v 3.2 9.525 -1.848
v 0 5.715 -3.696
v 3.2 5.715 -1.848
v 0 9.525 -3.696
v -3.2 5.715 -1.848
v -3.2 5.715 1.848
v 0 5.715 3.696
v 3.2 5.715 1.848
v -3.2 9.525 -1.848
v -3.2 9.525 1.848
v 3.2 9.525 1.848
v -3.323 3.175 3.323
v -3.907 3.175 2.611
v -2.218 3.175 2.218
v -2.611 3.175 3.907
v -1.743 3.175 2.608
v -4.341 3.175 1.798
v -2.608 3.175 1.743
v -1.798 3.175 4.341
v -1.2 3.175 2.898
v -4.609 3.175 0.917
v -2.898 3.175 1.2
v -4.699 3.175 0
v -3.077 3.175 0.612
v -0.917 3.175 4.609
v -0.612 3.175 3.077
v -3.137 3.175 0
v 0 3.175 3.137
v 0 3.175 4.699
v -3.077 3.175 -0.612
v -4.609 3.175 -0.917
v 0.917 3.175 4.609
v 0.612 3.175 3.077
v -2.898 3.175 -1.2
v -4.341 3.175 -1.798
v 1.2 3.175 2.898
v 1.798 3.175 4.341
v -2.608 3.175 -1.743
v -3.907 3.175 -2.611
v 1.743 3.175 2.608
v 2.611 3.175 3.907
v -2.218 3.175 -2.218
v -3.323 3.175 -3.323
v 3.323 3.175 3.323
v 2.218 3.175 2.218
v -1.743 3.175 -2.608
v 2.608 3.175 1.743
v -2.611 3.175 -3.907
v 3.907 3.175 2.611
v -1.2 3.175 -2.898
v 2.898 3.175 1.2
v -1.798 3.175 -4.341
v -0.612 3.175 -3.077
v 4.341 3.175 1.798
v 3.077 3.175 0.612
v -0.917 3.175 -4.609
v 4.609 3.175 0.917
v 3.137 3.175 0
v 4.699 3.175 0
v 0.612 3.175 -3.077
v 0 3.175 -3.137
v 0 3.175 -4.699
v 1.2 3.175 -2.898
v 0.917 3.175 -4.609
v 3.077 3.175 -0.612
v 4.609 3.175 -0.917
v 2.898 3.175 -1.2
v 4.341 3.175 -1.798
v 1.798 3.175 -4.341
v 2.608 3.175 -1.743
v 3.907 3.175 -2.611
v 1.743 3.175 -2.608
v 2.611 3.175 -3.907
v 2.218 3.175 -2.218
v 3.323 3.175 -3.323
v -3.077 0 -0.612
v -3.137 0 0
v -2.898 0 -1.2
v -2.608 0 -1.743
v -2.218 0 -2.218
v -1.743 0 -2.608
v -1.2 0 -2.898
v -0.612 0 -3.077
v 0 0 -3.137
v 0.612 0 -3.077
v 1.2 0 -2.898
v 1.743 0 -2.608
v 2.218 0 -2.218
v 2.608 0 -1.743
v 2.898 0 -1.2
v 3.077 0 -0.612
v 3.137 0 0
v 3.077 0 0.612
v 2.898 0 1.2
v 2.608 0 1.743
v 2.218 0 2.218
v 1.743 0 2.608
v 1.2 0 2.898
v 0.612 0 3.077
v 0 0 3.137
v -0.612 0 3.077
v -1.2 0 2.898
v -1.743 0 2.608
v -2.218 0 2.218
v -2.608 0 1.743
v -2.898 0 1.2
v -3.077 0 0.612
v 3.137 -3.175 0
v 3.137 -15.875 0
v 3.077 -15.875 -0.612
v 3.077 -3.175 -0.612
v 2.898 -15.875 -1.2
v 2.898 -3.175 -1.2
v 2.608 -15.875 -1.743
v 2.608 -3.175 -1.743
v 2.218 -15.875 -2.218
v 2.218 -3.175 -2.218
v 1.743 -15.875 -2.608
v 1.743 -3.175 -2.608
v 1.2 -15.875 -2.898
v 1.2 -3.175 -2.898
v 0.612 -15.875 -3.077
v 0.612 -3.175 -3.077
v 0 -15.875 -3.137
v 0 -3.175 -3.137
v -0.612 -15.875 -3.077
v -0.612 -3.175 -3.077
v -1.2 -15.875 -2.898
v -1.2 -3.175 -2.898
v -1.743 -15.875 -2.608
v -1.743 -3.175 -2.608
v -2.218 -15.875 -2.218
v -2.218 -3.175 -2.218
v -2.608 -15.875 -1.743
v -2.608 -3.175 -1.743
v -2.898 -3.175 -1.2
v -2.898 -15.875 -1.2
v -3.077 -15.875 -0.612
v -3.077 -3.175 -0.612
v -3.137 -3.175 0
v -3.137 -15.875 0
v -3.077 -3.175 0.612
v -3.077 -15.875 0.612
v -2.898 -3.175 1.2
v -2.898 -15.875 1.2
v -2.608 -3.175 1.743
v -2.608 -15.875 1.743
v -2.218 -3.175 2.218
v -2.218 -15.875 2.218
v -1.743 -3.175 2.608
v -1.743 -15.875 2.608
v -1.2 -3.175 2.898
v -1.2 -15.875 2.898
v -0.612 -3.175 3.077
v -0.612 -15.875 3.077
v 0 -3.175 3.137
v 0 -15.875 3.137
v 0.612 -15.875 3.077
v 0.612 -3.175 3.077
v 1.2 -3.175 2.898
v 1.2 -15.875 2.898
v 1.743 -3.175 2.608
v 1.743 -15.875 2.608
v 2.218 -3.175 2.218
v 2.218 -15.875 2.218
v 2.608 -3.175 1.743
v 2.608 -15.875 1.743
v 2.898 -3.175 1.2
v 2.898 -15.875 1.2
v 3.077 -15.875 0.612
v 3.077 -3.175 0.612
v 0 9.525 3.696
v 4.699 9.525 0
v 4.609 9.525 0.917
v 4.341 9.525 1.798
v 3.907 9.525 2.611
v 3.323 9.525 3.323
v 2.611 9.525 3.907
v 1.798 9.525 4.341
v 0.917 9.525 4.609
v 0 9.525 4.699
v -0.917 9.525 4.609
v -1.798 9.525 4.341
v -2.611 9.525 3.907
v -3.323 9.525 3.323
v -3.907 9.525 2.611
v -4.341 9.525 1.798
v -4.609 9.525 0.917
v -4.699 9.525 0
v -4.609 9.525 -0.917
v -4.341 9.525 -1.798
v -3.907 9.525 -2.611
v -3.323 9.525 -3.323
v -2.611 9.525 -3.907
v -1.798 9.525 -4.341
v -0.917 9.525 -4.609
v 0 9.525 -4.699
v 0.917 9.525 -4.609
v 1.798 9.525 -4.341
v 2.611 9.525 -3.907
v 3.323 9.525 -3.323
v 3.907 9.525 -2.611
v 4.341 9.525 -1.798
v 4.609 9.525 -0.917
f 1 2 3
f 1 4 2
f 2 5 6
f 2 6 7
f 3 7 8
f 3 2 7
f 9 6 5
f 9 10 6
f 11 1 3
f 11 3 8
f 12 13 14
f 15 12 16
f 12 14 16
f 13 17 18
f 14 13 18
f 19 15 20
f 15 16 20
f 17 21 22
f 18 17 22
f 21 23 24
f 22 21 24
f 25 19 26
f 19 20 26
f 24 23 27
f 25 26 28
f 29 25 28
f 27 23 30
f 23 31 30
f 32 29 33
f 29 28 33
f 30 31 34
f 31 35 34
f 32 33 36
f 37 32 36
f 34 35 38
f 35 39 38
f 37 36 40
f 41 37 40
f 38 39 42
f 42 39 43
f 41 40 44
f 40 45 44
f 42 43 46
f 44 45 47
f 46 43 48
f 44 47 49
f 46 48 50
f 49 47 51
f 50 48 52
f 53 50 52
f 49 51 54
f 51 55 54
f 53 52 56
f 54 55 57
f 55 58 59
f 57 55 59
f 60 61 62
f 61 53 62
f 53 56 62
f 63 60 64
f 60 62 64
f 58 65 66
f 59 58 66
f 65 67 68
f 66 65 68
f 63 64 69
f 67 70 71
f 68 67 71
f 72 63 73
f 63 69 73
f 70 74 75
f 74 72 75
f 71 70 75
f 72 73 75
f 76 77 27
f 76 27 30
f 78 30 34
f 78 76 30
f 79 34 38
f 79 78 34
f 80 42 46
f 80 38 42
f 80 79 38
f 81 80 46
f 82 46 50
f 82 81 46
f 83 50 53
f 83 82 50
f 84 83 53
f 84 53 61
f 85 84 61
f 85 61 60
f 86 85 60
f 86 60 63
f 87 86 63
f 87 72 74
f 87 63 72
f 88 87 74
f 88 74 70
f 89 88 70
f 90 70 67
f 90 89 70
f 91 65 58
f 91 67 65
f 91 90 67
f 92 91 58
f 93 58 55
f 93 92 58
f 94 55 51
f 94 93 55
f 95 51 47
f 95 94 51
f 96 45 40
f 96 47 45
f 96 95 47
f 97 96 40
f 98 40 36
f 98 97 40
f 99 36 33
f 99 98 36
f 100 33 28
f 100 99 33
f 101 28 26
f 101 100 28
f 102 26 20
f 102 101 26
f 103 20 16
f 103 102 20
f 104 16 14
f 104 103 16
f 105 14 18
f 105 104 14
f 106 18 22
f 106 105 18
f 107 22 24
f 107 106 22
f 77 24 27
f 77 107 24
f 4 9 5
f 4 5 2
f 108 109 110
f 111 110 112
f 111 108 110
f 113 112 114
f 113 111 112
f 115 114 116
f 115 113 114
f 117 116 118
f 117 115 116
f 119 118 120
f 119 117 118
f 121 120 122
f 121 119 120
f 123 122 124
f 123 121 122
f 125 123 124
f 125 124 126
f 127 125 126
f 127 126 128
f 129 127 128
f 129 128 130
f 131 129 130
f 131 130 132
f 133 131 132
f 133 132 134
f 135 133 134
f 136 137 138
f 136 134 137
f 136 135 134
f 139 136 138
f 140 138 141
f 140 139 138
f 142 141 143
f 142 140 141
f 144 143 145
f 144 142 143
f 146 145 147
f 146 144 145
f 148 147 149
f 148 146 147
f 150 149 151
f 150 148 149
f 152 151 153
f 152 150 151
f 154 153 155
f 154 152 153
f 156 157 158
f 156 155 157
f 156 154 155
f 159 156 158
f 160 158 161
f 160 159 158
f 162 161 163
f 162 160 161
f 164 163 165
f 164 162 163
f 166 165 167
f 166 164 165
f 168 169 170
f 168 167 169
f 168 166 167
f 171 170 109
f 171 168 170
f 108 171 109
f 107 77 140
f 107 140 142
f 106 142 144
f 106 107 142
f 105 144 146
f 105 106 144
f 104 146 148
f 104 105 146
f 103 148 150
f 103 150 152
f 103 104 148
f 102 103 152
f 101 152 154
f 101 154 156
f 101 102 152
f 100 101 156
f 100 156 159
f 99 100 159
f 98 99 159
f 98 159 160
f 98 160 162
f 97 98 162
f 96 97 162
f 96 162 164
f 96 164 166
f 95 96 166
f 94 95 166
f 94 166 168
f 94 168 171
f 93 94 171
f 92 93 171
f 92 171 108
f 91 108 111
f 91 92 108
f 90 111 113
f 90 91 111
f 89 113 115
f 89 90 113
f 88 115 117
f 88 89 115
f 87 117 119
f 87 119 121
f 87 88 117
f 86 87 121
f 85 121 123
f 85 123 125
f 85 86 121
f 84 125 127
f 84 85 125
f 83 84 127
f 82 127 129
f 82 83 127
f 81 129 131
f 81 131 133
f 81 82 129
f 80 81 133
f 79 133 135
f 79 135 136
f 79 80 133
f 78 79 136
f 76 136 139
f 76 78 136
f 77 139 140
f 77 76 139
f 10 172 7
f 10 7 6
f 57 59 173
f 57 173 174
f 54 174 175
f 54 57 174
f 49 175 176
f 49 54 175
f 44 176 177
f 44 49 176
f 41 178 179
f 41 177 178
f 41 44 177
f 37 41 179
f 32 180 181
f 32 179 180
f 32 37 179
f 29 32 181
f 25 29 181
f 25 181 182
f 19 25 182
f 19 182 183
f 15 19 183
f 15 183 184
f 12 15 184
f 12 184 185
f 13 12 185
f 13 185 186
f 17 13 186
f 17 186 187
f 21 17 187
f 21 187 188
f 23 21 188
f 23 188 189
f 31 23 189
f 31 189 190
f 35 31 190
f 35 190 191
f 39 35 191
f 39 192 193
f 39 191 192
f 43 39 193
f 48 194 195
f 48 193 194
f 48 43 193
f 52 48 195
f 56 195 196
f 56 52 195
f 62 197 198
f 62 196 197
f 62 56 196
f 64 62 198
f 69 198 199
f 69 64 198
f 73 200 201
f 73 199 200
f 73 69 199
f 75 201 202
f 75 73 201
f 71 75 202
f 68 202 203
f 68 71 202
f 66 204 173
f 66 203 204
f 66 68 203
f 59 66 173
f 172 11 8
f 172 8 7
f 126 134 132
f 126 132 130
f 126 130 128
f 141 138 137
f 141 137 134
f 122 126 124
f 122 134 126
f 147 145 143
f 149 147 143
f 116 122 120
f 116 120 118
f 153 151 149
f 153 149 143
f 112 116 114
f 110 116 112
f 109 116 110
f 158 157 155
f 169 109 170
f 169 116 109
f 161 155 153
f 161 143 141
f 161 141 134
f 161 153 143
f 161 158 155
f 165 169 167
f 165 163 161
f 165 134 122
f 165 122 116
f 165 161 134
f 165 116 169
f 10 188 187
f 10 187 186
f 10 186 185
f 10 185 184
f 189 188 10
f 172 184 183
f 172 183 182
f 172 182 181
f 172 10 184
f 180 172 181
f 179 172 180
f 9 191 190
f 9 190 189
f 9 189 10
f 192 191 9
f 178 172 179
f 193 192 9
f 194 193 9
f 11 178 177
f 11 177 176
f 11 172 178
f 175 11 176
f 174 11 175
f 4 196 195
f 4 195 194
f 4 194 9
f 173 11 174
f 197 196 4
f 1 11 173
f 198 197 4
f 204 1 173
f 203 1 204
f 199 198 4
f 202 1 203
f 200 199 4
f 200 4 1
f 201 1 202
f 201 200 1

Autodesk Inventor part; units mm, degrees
ref_plane "YZ Plane" through (0, 0, 0) normal (1, 0, 0) x (0, 1, 0)
ref_plane "XZ Plane" through (0, 0, 0) normal (0, 1, 0) x (-1, 0, 0)
ref_plane "XY Plane" through (0, 0, 0) normal (0, 0, 1) x (1, 0, 0)
sketch "Sketch1" plane through (0, 0, 0) normal (0, 1, 0) x (-1, 0, 0)
  circle A0 centre (0, 0) radius 3.1369
  dimension "d0" = 6.2738
extrude "Extrusion1" add sketch "Sketch1" along normal mid plane 6.35
sketch "Sketch2" plane through (0, 3.175, 0) normal (0, 1, 0) x (1, 0, 0)
  circle A0 centre (0, 0) radius 4.699
  dimension "d3" = 9.398
extrude "Extrusion2" add sketch "Sketch2" along normal blind 6.35
sketch "Sketch3" plane through (0, -3.175, 0) normal (0, -1, 0) x (1, 0, 0)
  circle A0 centre (0, 0) radius 3.1369
extrude "Extrusion3" add sketch "Sketch3" along normal blind 12.7
thread "Thread1" size "1/4-20 UNC" class "2A" standard "ANSI Unified Screw Threads" length 15.875
sketch "Sketch4" plane through (0, 9.525, 0) normal (0, 1, 0) x (1, 0, 0)
  line L0 (0, -3.6955) -> (-3.2004, -1.8478)
  line L1 (-3.2004, -1.8478) -> (-3.2004, 1.8478)
  line L2 (-3.2004, 1.8478) -> (0, 3.6955)
  line L3 (0, 3.6955) -> (3.2004, 1.8478)
  line L4 (3.2004, 1.8478) -> (3.2004, -1.8478)
  line L5 (3.2004, -1.8478) -> (0, -3.6955)
  point P0 (0, 0)
  point P1 (0, 0)
  dimension "d10" = 6.4008
extrude "Extrusion4" cut sketch "Sketch4" against normal blind 3.81
properties part number "Bolt 2.0" material "Steel, Galvanized"
